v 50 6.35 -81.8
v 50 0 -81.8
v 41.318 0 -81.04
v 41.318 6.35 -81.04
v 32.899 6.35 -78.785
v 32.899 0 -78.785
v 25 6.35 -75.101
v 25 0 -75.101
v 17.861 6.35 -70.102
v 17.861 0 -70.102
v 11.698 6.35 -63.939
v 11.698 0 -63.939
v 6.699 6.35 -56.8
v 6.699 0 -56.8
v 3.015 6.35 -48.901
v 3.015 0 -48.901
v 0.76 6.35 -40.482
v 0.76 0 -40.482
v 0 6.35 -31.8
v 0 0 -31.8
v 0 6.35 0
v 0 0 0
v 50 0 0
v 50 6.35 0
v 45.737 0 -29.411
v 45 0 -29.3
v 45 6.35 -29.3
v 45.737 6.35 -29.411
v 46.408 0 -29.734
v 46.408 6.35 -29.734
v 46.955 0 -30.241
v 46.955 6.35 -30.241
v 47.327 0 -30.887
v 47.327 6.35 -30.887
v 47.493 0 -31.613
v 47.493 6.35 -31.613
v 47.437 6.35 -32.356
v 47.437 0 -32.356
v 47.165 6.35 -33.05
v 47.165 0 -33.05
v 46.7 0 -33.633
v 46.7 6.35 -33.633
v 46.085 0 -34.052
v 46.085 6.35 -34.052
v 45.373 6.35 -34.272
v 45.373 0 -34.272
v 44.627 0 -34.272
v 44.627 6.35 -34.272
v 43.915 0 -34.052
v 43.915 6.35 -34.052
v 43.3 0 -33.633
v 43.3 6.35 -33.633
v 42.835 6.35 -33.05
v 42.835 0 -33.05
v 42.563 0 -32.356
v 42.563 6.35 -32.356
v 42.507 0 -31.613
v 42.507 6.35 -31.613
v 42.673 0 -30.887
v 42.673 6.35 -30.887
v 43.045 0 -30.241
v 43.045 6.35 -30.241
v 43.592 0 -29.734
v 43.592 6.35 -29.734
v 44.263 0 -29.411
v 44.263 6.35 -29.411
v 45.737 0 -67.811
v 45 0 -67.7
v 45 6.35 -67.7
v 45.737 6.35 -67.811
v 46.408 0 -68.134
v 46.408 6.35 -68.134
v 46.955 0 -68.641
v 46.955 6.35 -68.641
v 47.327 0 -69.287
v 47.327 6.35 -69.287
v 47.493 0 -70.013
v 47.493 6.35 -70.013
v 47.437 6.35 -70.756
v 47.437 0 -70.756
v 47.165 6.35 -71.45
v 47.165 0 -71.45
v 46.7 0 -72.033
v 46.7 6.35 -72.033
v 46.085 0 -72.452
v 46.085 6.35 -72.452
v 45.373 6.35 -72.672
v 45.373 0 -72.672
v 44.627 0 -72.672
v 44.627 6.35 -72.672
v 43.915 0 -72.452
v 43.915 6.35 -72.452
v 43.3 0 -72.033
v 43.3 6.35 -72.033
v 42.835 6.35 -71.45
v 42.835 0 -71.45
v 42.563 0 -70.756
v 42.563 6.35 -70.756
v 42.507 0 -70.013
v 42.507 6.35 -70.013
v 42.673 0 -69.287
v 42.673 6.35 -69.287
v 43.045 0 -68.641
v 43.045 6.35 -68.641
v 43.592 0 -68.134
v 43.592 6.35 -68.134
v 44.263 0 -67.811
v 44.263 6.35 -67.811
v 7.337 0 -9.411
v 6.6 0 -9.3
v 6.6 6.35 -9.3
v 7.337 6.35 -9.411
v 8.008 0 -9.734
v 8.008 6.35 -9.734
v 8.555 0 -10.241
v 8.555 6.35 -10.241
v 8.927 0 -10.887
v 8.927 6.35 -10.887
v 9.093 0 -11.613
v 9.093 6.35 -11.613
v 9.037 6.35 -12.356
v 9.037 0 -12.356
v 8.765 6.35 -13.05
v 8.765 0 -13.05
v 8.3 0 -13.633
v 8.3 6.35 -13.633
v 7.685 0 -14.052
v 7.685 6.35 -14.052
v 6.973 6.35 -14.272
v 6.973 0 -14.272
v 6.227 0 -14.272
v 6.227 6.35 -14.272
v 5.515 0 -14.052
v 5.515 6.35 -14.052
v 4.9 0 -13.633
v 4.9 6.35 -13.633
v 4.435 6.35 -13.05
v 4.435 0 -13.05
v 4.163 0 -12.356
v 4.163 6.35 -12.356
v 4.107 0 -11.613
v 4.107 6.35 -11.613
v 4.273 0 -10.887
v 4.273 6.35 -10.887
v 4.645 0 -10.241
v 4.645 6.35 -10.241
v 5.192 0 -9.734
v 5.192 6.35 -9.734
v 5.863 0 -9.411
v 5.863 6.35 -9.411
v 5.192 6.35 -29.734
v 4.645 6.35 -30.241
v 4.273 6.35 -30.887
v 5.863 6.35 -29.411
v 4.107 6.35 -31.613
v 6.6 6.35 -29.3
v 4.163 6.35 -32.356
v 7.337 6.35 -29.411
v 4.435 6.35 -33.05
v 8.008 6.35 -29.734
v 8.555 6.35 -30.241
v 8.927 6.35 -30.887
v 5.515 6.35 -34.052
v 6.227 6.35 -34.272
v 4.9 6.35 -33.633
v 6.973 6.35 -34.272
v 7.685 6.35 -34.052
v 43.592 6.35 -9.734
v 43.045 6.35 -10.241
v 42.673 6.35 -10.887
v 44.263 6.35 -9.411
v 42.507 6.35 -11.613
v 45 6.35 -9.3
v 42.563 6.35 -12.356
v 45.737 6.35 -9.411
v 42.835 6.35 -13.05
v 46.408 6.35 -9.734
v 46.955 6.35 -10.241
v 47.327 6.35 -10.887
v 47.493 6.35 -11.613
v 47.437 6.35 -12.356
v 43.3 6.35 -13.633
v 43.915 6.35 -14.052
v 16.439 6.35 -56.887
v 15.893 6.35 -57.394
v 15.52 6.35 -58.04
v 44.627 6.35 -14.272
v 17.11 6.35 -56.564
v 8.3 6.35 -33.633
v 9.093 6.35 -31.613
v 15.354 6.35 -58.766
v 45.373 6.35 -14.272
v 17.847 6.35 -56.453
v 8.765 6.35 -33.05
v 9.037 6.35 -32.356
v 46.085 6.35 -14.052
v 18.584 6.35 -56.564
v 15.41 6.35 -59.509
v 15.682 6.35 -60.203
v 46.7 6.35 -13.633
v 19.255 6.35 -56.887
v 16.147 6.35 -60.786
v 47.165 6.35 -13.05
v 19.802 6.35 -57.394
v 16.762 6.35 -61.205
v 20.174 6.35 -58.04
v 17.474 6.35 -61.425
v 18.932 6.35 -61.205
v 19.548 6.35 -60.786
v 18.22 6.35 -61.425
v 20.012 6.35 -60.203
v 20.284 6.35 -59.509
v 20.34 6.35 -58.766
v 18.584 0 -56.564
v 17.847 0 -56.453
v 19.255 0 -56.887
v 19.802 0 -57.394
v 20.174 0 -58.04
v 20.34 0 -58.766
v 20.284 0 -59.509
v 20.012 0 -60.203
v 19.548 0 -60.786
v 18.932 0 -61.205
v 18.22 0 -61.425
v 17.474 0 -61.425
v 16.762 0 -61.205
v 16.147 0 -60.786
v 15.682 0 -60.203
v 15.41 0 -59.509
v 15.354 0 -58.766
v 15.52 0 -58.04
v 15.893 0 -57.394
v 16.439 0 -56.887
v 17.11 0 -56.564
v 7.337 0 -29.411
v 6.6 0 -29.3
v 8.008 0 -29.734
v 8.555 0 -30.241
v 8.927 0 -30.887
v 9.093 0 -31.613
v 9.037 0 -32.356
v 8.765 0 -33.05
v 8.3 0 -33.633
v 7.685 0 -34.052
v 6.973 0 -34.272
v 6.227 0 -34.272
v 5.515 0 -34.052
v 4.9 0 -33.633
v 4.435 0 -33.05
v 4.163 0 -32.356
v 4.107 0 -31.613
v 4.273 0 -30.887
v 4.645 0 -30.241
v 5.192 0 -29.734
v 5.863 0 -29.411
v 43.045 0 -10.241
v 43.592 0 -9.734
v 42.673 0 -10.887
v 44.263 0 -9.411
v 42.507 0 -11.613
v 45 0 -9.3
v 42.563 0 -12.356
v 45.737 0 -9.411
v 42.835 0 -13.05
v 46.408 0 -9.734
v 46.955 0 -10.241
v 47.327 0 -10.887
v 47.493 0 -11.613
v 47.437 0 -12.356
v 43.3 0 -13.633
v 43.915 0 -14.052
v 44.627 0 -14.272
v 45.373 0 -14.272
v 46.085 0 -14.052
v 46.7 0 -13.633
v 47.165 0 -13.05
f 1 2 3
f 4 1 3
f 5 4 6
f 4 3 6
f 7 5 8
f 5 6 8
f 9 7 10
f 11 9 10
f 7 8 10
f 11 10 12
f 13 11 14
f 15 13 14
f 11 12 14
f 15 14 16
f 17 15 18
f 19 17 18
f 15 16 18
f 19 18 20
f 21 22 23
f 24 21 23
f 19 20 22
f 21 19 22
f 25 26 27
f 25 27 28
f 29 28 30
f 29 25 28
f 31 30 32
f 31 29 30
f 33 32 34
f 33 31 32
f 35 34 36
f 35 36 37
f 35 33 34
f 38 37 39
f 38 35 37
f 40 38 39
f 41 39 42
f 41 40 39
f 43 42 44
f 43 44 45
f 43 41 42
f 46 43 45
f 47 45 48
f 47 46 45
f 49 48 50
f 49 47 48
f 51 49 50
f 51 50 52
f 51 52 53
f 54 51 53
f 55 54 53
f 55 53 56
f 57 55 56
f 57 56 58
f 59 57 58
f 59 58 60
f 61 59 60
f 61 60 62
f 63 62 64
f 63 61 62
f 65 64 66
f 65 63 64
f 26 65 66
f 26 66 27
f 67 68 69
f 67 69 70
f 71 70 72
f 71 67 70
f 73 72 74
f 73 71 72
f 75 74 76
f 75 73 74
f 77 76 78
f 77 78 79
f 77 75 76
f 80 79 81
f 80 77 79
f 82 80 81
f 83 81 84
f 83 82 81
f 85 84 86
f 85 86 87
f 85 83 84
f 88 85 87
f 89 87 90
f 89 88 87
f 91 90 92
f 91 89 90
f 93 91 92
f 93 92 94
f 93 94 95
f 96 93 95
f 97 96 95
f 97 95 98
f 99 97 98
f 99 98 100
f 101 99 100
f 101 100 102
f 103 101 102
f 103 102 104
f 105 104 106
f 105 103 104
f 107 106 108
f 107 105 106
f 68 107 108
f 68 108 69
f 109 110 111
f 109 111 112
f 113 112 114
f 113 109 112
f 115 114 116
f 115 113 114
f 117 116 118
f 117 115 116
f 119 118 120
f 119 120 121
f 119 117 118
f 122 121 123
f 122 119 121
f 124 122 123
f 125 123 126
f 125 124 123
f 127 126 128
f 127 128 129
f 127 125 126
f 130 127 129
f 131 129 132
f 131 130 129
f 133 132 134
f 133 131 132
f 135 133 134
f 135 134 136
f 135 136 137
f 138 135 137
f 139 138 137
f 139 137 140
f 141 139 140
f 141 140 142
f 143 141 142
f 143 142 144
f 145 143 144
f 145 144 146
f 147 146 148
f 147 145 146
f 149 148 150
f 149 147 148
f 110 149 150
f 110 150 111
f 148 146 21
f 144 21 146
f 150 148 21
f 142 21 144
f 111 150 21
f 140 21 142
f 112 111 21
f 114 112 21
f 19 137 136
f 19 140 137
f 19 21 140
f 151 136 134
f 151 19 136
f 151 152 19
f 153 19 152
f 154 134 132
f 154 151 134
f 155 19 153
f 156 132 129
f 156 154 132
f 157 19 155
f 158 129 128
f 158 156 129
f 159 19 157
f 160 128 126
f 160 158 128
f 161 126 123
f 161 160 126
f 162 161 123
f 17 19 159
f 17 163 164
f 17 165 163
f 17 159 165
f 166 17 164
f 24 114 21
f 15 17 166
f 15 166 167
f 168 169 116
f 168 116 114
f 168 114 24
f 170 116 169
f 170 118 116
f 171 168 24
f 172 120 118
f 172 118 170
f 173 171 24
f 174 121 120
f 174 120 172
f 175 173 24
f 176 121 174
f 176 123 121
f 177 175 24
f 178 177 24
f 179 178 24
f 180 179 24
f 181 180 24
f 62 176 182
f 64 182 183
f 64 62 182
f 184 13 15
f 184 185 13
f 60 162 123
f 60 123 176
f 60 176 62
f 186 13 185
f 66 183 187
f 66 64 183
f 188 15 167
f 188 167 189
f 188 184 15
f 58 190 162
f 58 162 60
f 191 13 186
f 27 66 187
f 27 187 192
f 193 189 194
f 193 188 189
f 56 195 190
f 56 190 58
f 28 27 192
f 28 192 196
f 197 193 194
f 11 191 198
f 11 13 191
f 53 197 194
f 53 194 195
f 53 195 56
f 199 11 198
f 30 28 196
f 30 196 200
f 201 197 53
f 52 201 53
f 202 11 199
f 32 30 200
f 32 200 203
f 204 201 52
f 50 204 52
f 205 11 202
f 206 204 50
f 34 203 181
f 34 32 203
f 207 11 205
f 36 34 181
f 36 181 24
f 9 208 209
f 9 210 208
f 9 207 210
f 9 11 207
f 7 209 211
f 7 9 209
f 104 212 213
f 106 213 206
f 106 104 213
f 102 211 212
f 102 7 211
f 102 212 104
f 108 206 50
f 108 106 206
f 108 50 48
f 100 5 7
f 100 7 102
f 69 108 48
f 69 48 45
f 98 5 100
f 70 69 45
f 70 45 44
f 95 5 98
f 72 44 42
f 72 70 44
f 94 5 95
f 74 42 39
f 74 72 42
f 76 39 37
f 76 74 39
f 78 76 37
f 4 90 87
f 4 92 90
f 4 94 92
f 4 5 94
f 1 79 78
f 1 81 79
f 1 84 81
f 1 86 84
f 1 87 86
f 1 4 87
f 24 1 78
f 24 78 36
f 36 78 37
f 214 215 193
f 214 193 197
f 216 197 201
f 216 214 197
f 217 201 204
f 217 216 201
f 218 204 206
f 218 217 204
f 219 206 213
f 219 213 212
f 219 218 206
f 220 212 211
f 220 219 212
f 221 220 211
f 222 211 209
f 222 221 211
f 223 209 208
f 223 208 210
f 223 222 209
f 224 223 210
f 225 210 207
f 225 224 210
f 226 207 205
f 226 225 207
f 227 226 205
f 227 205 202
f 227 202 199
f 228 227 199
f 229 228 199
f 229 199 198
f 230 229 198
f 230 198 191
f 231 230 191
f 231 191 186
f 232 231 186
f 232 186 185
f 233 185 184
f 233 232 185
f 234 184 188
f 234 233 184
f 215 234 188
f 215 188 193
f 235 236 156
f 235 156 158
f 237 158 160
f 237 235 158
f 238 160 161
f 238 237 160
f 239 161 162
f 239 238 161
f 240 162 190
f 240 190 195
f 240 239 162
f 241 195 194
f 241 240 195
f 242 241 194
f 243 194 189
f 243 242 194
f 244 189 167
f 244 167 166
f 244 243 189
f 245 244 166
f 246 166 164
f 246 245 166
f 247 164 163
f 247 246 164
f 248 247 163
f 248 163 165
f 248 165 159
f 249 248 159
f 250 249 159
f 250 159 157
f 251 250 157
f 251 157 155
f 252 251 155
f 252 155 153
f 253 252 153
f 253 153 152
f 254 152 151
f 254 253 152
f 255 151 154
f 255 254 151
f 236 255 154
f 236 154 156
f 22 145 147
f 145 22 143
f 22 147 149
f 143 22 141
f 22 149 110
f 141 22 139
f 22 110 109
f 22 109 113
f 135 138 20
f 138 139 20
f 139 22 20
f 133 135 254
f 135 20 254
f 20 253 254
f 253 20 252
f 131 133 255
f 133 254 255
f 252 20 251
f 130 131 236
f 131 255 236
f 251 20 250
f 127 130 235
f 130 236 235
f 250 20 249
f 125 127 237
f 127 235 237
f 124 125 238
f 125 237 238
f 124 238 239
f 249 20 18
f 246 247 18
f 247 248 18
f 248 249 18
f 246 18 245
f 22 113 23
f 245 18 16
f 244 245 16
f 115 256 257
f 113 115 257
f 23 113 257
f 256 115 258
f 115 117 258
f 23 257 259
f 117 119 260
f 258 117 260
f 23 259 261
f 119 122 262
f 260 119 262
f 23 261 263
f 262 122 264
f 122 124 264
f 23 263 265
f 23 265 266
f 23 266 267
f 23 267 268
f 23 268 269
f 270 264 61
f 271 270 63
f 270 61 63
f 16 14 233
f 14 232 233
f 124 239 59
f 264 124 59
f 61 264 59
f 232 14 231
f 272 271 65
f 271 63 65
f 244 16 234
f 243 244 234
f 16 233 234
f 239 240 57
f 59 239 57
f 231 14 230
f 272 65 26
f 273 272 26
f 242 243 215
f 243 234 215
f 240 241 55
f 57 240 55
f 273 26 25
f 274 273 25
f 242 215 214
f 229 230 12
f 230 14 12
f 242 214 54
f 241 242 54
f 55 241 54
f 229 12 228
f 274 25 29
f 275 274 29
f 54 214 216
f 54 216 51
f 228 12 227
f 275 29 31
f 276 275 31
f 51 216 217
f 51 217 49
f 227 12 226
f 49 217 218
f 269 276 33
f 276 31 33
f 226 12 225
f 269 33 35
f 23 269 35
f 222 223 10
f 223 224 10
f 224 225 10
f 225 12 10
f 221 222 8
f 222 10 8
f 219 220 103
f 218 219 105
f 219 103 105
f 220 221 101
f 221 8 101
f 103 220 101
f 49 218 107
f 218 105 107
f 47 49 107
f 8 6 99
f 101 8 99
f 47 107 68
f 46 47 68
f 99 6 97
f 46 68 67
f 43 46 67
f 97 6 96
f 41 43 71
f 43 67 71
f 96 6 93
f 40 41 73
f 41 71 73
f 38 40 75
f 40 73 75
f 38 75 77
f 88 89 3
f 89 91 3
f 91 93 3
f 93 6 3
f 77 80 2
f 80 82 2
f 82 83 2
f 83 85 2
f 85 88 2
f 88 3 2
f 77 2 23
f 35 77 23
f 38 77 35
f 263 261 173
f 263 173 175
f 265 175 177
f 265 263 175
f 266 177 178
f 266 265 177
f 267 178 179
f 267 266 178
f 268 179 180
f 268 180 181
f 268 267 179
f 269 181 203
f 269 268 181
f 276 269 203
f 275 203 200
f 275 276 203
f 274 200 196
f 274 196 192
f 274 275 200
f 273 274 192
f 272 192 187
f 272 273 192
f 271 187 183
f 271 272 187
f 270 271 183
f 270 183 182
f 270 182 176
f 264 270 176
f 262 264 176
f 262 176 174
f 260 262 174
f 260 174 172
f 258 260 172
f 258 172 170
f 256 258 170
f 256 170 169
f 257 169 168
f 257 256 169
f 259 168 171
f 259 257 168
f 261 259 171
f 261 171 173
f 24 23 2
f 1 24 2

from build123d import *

# Parameters (mm, degrees)
SKETCH2_R           = 2.5
BOSS_EXTRUDE1_DEPTH = 6.35


with BuildPart() as part:
    # Sketch2 → Boss-Extrude1 (new body)
    with BuildSketch(Plane(origin=(0, 0, 0), x_dir=(1, 0, 0), z_dir=(0, 1, 0))):
        with BuildLine():
            Line((50, 31.8), (50, 81.8))
            ThreePointArc((50, 81.8), (14.644660941, 67.155339059), (0, 31.8))
            Line((0, 31.8), (0, 0))
            Line((0, 0), (50, 0))
            Line((50, 0), (50, 31.8))
        make_face()
        with Locations(Location((45, 31.8, 0), (0, 0, 270))):
            Circle(SKETCH2_R, mode=Mode.SUBTRACT)
        with Locations(Location((6.6, 31.8, 0), (0, 0, 270))):
            Circle(SKETCH2_R, mode=Mode.SUBTRACT)
        with Locations(Location((17.847099602, 58.952900398, 0), (0, 0, 270))):
            Circle(SKETCH2_R, mode=Mode.SUBTRACT)
        with Locations(Location((45, 70.2, 0), (0, 0, 270))):
            Circle(SKETCH2_R, mode=Mode.SUBTRACT)
        with Locations(Location((6.6, 11.8, 0), (0, 0, 270))):
            Circle(SKETCH2_R, mode=Mode.SUBTRACT)
        with Locations(Location((45, 11.8, 0), (0, 0, 270))):
            Circle(SKETCH2_R, mode=Mode.SUBTRACT)
    extrude(amount=BOSS_EXTRUDE1_DEPTH)


solid = part.part
